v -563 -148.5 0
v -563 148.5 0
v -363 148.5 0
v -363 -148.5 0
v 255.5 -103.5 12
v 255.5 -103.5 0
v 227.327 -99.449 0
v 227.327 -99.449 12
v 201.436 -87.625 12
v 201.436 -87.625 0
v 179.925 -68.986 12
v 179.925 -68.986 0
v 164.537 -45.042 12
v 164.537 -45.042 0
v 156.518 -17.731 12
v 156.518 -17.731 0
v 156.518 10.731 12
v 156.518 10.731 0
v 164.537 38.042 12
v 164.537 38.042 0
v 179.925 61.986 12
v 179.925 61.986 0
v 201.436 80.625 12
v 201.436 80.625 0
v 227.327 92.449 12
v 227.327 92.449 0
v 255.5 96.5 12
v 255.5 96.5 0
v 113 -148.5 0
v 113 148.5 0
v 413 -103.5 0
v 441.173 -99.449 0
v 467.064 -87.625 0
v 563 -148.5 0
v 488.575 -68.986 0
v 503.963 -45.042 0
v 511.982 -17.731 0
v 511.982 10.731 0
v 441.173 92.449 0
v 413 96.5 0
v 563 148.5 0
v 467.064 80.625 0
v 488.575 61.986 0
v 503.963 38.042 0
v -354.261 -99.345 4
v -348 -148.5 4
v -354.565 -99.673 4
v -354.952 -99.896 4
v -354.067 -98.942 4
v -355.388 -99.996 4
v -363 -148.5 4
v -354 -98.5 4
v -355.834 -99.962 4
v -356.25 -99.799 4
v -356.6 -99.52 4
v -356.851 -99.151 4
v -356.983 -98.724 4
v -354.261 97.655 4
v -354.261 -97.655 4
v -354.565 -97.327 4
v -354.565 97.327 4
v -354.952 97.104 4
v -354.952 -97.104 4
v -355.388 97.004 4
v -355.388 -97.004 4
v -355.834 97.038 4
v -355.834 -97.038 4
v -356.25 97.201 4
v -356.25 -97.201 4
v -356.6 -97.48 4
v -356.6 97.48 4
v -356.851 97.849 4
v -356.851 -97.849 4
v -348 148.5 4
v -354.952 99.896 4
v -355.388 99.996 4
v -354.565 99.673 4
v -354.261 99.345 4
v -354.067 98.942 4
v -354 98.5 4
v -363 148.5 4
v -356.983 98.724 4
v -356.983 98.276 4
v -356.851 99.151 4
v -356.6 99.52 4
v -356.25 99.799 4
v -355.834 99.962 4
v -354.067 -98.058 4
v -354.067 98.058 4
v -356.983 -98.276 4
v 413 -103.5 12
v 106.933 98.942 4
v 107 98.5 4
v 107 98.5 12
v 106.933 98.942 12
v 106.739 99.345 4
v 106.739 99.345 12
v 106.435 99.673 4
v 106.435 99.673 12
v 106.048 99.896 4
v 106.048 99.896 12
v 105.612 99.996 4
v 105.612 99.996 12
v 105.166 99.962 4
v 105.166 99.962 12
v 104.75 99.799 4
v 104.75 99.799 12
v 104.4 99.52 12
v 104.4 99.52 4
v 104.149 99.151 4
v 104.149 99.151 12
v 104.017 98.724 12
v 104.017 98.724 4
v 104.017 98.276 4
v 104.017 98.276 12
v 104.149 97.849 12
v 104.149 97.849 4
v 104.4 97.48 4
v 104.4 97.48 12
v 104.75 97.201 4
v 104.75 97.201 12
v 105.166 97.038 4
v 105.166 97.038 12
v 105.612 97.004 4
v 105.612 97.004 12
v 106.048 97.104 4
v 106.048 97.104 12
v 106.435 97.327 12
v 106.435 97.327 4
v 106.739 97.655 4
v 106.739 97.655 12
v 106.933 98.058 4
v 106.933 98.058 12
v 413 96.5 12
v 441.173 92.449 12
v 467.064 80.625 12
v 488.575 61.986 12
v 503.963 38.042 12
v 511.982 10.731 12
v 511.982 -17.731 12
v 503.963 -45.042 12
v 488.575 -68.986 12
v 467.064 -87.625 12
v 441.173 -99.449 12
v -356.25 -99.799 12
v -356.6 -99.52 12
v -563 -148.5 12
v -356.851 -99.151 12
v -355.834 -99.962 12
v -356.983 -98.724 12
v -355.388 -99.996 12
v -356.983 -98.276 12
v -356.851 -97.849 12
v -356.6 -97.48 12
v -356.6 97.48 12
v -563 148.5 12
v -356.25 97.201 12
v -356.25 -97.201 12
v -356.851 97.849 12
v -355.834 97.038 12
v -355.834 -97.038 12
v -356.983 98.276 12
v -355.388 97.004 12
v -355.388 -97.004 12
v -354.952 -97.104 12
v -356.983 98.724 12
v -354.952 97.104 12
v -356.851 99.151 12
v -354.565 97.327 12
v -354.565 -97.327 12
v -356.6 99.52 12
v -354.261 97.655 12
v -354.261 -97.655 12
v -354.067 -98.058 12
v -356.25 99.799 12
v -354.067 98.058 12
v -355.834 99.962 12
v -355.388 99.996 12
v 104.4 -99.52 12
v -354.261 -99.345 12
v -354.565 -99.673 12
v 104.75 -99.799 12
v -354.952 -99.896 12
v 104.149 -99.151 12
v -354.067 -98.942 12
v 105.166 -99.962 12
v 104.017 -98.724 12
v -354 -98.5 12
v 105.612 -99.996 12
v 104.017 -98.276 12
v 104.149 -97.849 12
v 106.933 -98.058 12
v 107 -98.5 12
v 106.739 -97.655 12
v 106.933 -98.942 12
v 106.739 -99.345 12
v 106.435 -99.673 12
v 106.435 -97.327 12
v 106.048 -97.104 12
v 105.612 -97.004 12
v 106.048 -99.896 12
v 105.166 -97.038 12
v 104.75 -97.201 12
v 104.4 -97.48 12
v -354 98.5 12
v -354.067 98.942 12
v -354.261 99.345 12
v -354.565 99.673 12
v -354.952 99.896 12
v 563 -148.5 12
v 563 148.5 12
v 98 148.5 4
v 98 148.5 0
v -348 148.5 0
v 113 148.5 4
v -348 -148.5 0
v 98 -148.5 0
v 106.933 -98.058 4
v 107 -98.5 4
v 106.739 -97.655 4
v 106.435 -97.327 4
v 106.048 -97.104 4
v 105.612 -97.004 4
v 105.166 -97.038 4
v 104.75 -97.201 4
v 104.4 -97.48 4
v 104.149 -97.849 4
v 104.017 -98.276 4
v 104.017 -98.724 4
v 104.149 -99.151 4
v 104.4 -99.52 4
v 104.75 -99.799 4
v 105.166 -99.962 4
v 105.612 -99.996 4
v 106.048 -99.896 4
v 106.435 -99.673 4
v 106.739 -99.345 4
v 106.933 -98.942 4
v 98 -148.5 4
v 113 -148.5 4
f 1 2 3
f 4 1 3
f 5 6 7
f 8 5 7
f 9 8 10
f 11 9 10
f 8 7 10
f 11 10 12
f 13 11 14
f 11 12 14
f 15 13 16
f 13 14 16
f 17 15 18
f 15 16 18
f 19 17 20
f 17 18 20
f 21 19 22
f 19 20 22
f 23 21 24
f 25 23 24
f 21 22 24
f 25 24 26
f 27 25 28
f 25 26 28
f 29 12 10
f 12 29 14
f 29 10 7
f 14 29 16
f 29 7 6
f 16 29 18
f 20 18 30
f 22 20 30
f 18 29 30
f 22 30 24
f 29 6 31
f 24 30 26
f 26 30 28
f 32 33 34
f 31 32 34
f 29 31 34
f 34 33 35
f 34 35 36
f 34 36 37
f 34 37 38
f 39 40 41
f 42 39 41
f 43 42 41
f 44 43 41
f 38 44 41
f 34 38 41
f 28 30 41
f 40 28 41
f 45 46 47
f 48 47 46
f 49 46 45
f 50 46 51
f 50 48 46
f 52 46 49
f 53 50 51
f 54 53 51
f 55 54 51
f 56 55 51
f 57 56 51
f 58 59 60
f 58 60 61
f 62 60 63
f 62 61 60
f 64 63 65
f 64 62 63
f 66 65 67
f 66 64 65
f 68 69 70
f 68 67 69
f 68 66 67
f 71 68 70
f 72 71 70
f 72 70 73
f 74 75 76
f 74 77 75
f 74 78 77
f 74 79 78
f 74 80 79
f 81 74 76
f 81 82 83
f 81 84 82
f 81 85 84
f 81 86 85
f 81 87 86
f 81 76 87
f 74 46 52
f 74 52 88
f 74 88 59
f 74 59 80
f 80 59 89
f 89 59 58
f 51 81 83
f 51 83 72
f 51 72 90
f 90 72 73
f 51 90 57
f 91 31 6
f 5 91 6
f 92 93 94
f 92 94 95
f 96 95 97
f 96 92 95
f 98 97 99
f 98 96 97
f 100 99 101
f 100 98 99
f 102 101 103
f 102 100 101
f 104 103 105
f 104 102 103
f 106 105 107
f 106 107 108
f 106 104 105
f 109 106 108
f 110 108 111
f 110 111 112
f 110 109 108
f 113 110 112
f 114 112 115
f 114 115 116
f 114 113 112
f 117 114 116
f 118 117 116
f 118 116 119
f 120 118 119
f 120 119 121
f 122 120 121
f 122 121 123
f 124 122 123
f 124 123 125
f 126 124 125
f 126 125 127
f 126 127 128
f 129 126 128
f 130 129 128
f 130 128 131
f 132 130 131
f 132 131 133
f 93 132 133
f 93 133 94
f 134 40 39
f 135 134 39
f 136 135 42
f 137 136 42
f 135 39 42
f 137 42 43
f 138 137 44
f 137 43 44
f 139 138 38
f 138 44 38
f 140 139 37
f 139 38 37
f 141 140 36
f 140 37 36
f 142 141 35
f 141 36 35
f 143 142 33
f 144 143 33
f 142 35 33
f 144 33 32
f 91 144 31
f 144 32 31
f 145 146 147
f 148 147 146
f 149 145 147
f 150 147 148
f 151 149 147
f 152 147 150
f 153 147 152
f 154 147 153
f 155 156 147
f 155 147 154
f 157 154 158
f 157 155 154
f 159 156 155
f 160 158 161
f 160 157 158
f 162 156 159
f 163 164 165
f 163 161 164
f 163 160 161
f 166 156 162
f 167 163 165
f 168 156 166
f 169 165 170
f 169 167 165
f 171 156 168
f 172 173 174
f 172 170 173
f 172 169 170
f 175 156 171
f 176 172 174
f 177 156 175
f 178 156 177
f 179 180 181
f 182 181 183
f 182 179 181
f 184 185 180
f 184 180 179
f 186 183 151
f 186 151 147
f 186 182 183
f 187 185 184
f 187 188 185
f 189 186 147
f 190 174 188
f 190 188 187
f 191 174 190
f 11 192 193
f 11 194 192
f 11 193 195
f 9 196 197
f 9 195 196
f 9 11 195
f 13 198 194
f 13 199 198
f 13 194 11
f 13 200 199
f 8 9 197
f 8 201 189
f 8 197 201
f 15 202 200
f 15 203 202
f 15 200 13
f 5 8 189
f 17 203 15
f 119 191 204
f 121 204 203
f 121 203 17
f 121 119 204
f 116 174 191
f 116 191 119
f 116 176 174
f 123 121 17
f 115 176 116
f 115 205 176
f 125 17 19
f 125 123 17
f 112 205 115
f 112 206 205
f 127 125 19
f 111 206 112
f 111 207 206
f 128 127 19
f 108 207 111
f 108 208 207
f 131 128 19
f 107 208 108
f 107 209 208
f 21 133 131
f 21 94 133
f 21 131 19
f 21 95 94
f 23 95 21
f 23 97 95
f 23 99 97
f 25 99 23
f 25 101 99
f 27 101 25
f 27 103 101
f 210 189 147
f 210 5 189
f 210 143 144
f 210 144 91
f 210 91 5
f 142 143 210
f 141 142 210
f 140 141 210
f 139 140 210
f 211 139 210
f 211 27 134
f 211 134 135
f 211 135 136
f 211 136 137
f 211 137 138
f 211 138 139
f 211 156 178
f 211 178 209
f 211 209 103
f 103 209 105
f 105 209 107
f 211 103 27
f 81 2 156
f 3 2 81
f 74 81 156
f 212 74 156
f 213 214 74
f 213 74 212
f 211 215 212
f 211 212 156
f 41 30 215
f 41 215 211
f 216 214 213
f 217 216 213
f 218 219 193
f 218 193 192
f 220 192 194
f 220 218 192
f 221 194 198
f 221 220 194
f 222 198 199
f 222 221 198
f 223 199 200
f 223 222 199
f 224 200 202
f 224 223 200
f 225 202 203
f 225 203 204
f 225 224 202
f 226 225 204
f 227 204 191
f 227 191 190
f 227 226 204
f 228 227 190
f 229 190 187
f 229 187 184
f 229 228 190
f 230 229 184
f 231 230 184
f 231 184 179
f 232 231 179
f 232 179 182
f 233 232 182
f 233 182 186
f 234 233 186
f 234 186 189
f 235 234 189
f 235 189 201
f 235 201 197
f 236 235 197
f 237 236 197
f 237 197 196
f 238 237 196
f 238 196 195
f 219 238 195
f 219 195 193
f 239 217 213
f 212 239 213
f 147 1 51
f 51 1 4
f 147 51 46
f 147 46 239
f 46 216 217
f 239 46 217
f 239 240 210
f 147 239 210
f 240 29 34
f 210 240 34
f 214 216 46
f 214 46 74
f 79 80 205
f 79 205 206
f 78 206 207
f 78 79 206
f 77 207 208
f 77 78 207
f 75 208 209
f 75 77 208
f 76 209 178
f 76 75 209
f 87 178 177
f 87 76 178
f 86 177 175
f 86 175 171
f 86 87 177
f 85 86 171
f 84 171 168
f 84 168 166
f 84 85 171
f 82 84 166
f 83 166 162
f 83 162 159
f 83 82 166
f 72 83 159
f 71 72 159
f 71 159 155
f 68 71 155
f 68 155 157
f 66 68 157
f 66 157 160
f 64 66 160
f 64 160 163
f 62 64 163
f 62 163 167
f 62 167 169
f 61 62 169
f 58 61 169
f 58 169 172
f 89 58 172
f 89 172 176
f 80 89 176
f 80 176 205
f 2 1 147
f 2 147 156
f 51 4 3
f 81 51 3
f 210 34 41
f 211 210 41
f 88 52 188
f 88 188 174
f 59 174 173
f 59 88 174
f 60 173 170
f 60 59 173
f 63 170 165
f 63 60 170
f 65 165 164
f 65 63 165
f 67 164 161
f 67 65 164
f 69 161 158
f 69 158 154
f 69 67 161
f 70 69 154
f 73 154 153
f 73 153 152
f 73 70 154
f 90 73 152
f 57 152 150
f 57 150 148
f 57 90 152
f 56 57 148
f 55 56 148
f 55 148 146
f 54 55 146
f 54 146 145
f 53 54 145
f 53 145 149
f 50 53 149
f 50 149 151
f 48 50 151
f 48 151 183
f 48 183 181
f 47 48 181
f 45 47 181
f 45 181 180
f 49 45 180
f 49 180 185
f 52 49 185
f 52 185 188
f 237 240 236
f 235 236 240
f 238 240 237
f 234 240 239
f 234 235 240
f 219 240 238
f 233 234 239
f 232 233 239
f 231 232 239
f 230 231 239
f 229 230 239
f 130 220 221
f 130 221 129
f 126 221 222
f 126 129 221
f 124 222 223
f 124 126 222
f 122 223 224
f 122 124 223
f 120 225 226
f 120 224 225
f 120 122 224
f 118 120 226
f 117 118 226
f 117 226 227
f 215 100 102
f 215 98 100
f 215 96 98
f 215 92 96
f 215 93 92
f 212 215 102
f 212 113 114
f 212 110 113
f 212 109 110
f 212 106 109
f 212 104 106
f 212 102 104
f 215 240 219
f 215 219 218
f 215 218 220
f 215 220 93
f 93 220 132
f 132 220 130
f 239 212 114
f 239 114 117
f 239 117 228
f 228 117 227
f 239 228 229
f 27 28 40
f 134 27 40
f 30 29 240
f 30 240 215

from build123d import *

# Parameters (mm, degrees)
ESQUISSE1_W             = 1126
ESQUISSE1_H             = 297
ESQUISSE1_R             = 1.5
BOSS_EXTRU_1_DEPTH      = 12
ESQUISSE2_W             = 15
ESQUISSE2_H             = 678.559774038
ESQUISSE2_H_2           = 656.681006804
ENL_V_MAT_EXTRU_1_DEPTH = 4


with BuildPart() as part:
    # Esquisse1 → Boss.-Extru.1 (new body)
    with BuildSketch(Plane.XY):
        Rectangle(ESQUISSE1_W, ESQUISSE1_H)
        with Locations((105.5, 98.5)):
            Circle(ESQUISSE1_R, mode=Mode.SUBTRACT)
        with Locations((105.5, -98.5)):
            Circle(ESQUISSE1_R, mode=Mode.SUBTRACT)
        with Locations((-355.5, 98.5)):
            Circle(ESQUISSE1_R, mode=Mode.SUBTRACT)
        with Locations((-355.5, -98.5)):
            Circle(ESQUISSE1_R, mode=Mode.SUBTRACT)
        with BuildLine():
            Line((255.5, 96.5), (413, 96.5))
            ThreePointArc((413, 96.5), (513, -3.5), (413, -103.5))
            Line((413, -103.5), (255.5, -103.5))
            ThreePointArc((255.5, -103.5), (155.5, -3.5), (255.5, 96.5))
        make_face(mode=Mode.SUBTRACT)
    extrude(amount=BOSS_EXTRU_1_DEPTH)

    # Esquisse2 → Enlèv. mat.-Extru.1 (cut)
    with BuildSketch(Plane(origin=(0, 0, 0), x_dir=(-1, 0, 0), z_dir=(0, 0, -1))):
        with Locations((-105.5, 98.5)):
            Rectangle(ESQUISSE2_W, ESQUISSE2_H)
        with Locations((355.5, 98.5)):
            Rectangle(ESQUISSE2_W, ESQUISSE2_H_2)
    extrude(amount=-ENL_V_MAT_EXTRU_1_DEPTH, mode=Mode.SUBTRACT)


solid = part.part
